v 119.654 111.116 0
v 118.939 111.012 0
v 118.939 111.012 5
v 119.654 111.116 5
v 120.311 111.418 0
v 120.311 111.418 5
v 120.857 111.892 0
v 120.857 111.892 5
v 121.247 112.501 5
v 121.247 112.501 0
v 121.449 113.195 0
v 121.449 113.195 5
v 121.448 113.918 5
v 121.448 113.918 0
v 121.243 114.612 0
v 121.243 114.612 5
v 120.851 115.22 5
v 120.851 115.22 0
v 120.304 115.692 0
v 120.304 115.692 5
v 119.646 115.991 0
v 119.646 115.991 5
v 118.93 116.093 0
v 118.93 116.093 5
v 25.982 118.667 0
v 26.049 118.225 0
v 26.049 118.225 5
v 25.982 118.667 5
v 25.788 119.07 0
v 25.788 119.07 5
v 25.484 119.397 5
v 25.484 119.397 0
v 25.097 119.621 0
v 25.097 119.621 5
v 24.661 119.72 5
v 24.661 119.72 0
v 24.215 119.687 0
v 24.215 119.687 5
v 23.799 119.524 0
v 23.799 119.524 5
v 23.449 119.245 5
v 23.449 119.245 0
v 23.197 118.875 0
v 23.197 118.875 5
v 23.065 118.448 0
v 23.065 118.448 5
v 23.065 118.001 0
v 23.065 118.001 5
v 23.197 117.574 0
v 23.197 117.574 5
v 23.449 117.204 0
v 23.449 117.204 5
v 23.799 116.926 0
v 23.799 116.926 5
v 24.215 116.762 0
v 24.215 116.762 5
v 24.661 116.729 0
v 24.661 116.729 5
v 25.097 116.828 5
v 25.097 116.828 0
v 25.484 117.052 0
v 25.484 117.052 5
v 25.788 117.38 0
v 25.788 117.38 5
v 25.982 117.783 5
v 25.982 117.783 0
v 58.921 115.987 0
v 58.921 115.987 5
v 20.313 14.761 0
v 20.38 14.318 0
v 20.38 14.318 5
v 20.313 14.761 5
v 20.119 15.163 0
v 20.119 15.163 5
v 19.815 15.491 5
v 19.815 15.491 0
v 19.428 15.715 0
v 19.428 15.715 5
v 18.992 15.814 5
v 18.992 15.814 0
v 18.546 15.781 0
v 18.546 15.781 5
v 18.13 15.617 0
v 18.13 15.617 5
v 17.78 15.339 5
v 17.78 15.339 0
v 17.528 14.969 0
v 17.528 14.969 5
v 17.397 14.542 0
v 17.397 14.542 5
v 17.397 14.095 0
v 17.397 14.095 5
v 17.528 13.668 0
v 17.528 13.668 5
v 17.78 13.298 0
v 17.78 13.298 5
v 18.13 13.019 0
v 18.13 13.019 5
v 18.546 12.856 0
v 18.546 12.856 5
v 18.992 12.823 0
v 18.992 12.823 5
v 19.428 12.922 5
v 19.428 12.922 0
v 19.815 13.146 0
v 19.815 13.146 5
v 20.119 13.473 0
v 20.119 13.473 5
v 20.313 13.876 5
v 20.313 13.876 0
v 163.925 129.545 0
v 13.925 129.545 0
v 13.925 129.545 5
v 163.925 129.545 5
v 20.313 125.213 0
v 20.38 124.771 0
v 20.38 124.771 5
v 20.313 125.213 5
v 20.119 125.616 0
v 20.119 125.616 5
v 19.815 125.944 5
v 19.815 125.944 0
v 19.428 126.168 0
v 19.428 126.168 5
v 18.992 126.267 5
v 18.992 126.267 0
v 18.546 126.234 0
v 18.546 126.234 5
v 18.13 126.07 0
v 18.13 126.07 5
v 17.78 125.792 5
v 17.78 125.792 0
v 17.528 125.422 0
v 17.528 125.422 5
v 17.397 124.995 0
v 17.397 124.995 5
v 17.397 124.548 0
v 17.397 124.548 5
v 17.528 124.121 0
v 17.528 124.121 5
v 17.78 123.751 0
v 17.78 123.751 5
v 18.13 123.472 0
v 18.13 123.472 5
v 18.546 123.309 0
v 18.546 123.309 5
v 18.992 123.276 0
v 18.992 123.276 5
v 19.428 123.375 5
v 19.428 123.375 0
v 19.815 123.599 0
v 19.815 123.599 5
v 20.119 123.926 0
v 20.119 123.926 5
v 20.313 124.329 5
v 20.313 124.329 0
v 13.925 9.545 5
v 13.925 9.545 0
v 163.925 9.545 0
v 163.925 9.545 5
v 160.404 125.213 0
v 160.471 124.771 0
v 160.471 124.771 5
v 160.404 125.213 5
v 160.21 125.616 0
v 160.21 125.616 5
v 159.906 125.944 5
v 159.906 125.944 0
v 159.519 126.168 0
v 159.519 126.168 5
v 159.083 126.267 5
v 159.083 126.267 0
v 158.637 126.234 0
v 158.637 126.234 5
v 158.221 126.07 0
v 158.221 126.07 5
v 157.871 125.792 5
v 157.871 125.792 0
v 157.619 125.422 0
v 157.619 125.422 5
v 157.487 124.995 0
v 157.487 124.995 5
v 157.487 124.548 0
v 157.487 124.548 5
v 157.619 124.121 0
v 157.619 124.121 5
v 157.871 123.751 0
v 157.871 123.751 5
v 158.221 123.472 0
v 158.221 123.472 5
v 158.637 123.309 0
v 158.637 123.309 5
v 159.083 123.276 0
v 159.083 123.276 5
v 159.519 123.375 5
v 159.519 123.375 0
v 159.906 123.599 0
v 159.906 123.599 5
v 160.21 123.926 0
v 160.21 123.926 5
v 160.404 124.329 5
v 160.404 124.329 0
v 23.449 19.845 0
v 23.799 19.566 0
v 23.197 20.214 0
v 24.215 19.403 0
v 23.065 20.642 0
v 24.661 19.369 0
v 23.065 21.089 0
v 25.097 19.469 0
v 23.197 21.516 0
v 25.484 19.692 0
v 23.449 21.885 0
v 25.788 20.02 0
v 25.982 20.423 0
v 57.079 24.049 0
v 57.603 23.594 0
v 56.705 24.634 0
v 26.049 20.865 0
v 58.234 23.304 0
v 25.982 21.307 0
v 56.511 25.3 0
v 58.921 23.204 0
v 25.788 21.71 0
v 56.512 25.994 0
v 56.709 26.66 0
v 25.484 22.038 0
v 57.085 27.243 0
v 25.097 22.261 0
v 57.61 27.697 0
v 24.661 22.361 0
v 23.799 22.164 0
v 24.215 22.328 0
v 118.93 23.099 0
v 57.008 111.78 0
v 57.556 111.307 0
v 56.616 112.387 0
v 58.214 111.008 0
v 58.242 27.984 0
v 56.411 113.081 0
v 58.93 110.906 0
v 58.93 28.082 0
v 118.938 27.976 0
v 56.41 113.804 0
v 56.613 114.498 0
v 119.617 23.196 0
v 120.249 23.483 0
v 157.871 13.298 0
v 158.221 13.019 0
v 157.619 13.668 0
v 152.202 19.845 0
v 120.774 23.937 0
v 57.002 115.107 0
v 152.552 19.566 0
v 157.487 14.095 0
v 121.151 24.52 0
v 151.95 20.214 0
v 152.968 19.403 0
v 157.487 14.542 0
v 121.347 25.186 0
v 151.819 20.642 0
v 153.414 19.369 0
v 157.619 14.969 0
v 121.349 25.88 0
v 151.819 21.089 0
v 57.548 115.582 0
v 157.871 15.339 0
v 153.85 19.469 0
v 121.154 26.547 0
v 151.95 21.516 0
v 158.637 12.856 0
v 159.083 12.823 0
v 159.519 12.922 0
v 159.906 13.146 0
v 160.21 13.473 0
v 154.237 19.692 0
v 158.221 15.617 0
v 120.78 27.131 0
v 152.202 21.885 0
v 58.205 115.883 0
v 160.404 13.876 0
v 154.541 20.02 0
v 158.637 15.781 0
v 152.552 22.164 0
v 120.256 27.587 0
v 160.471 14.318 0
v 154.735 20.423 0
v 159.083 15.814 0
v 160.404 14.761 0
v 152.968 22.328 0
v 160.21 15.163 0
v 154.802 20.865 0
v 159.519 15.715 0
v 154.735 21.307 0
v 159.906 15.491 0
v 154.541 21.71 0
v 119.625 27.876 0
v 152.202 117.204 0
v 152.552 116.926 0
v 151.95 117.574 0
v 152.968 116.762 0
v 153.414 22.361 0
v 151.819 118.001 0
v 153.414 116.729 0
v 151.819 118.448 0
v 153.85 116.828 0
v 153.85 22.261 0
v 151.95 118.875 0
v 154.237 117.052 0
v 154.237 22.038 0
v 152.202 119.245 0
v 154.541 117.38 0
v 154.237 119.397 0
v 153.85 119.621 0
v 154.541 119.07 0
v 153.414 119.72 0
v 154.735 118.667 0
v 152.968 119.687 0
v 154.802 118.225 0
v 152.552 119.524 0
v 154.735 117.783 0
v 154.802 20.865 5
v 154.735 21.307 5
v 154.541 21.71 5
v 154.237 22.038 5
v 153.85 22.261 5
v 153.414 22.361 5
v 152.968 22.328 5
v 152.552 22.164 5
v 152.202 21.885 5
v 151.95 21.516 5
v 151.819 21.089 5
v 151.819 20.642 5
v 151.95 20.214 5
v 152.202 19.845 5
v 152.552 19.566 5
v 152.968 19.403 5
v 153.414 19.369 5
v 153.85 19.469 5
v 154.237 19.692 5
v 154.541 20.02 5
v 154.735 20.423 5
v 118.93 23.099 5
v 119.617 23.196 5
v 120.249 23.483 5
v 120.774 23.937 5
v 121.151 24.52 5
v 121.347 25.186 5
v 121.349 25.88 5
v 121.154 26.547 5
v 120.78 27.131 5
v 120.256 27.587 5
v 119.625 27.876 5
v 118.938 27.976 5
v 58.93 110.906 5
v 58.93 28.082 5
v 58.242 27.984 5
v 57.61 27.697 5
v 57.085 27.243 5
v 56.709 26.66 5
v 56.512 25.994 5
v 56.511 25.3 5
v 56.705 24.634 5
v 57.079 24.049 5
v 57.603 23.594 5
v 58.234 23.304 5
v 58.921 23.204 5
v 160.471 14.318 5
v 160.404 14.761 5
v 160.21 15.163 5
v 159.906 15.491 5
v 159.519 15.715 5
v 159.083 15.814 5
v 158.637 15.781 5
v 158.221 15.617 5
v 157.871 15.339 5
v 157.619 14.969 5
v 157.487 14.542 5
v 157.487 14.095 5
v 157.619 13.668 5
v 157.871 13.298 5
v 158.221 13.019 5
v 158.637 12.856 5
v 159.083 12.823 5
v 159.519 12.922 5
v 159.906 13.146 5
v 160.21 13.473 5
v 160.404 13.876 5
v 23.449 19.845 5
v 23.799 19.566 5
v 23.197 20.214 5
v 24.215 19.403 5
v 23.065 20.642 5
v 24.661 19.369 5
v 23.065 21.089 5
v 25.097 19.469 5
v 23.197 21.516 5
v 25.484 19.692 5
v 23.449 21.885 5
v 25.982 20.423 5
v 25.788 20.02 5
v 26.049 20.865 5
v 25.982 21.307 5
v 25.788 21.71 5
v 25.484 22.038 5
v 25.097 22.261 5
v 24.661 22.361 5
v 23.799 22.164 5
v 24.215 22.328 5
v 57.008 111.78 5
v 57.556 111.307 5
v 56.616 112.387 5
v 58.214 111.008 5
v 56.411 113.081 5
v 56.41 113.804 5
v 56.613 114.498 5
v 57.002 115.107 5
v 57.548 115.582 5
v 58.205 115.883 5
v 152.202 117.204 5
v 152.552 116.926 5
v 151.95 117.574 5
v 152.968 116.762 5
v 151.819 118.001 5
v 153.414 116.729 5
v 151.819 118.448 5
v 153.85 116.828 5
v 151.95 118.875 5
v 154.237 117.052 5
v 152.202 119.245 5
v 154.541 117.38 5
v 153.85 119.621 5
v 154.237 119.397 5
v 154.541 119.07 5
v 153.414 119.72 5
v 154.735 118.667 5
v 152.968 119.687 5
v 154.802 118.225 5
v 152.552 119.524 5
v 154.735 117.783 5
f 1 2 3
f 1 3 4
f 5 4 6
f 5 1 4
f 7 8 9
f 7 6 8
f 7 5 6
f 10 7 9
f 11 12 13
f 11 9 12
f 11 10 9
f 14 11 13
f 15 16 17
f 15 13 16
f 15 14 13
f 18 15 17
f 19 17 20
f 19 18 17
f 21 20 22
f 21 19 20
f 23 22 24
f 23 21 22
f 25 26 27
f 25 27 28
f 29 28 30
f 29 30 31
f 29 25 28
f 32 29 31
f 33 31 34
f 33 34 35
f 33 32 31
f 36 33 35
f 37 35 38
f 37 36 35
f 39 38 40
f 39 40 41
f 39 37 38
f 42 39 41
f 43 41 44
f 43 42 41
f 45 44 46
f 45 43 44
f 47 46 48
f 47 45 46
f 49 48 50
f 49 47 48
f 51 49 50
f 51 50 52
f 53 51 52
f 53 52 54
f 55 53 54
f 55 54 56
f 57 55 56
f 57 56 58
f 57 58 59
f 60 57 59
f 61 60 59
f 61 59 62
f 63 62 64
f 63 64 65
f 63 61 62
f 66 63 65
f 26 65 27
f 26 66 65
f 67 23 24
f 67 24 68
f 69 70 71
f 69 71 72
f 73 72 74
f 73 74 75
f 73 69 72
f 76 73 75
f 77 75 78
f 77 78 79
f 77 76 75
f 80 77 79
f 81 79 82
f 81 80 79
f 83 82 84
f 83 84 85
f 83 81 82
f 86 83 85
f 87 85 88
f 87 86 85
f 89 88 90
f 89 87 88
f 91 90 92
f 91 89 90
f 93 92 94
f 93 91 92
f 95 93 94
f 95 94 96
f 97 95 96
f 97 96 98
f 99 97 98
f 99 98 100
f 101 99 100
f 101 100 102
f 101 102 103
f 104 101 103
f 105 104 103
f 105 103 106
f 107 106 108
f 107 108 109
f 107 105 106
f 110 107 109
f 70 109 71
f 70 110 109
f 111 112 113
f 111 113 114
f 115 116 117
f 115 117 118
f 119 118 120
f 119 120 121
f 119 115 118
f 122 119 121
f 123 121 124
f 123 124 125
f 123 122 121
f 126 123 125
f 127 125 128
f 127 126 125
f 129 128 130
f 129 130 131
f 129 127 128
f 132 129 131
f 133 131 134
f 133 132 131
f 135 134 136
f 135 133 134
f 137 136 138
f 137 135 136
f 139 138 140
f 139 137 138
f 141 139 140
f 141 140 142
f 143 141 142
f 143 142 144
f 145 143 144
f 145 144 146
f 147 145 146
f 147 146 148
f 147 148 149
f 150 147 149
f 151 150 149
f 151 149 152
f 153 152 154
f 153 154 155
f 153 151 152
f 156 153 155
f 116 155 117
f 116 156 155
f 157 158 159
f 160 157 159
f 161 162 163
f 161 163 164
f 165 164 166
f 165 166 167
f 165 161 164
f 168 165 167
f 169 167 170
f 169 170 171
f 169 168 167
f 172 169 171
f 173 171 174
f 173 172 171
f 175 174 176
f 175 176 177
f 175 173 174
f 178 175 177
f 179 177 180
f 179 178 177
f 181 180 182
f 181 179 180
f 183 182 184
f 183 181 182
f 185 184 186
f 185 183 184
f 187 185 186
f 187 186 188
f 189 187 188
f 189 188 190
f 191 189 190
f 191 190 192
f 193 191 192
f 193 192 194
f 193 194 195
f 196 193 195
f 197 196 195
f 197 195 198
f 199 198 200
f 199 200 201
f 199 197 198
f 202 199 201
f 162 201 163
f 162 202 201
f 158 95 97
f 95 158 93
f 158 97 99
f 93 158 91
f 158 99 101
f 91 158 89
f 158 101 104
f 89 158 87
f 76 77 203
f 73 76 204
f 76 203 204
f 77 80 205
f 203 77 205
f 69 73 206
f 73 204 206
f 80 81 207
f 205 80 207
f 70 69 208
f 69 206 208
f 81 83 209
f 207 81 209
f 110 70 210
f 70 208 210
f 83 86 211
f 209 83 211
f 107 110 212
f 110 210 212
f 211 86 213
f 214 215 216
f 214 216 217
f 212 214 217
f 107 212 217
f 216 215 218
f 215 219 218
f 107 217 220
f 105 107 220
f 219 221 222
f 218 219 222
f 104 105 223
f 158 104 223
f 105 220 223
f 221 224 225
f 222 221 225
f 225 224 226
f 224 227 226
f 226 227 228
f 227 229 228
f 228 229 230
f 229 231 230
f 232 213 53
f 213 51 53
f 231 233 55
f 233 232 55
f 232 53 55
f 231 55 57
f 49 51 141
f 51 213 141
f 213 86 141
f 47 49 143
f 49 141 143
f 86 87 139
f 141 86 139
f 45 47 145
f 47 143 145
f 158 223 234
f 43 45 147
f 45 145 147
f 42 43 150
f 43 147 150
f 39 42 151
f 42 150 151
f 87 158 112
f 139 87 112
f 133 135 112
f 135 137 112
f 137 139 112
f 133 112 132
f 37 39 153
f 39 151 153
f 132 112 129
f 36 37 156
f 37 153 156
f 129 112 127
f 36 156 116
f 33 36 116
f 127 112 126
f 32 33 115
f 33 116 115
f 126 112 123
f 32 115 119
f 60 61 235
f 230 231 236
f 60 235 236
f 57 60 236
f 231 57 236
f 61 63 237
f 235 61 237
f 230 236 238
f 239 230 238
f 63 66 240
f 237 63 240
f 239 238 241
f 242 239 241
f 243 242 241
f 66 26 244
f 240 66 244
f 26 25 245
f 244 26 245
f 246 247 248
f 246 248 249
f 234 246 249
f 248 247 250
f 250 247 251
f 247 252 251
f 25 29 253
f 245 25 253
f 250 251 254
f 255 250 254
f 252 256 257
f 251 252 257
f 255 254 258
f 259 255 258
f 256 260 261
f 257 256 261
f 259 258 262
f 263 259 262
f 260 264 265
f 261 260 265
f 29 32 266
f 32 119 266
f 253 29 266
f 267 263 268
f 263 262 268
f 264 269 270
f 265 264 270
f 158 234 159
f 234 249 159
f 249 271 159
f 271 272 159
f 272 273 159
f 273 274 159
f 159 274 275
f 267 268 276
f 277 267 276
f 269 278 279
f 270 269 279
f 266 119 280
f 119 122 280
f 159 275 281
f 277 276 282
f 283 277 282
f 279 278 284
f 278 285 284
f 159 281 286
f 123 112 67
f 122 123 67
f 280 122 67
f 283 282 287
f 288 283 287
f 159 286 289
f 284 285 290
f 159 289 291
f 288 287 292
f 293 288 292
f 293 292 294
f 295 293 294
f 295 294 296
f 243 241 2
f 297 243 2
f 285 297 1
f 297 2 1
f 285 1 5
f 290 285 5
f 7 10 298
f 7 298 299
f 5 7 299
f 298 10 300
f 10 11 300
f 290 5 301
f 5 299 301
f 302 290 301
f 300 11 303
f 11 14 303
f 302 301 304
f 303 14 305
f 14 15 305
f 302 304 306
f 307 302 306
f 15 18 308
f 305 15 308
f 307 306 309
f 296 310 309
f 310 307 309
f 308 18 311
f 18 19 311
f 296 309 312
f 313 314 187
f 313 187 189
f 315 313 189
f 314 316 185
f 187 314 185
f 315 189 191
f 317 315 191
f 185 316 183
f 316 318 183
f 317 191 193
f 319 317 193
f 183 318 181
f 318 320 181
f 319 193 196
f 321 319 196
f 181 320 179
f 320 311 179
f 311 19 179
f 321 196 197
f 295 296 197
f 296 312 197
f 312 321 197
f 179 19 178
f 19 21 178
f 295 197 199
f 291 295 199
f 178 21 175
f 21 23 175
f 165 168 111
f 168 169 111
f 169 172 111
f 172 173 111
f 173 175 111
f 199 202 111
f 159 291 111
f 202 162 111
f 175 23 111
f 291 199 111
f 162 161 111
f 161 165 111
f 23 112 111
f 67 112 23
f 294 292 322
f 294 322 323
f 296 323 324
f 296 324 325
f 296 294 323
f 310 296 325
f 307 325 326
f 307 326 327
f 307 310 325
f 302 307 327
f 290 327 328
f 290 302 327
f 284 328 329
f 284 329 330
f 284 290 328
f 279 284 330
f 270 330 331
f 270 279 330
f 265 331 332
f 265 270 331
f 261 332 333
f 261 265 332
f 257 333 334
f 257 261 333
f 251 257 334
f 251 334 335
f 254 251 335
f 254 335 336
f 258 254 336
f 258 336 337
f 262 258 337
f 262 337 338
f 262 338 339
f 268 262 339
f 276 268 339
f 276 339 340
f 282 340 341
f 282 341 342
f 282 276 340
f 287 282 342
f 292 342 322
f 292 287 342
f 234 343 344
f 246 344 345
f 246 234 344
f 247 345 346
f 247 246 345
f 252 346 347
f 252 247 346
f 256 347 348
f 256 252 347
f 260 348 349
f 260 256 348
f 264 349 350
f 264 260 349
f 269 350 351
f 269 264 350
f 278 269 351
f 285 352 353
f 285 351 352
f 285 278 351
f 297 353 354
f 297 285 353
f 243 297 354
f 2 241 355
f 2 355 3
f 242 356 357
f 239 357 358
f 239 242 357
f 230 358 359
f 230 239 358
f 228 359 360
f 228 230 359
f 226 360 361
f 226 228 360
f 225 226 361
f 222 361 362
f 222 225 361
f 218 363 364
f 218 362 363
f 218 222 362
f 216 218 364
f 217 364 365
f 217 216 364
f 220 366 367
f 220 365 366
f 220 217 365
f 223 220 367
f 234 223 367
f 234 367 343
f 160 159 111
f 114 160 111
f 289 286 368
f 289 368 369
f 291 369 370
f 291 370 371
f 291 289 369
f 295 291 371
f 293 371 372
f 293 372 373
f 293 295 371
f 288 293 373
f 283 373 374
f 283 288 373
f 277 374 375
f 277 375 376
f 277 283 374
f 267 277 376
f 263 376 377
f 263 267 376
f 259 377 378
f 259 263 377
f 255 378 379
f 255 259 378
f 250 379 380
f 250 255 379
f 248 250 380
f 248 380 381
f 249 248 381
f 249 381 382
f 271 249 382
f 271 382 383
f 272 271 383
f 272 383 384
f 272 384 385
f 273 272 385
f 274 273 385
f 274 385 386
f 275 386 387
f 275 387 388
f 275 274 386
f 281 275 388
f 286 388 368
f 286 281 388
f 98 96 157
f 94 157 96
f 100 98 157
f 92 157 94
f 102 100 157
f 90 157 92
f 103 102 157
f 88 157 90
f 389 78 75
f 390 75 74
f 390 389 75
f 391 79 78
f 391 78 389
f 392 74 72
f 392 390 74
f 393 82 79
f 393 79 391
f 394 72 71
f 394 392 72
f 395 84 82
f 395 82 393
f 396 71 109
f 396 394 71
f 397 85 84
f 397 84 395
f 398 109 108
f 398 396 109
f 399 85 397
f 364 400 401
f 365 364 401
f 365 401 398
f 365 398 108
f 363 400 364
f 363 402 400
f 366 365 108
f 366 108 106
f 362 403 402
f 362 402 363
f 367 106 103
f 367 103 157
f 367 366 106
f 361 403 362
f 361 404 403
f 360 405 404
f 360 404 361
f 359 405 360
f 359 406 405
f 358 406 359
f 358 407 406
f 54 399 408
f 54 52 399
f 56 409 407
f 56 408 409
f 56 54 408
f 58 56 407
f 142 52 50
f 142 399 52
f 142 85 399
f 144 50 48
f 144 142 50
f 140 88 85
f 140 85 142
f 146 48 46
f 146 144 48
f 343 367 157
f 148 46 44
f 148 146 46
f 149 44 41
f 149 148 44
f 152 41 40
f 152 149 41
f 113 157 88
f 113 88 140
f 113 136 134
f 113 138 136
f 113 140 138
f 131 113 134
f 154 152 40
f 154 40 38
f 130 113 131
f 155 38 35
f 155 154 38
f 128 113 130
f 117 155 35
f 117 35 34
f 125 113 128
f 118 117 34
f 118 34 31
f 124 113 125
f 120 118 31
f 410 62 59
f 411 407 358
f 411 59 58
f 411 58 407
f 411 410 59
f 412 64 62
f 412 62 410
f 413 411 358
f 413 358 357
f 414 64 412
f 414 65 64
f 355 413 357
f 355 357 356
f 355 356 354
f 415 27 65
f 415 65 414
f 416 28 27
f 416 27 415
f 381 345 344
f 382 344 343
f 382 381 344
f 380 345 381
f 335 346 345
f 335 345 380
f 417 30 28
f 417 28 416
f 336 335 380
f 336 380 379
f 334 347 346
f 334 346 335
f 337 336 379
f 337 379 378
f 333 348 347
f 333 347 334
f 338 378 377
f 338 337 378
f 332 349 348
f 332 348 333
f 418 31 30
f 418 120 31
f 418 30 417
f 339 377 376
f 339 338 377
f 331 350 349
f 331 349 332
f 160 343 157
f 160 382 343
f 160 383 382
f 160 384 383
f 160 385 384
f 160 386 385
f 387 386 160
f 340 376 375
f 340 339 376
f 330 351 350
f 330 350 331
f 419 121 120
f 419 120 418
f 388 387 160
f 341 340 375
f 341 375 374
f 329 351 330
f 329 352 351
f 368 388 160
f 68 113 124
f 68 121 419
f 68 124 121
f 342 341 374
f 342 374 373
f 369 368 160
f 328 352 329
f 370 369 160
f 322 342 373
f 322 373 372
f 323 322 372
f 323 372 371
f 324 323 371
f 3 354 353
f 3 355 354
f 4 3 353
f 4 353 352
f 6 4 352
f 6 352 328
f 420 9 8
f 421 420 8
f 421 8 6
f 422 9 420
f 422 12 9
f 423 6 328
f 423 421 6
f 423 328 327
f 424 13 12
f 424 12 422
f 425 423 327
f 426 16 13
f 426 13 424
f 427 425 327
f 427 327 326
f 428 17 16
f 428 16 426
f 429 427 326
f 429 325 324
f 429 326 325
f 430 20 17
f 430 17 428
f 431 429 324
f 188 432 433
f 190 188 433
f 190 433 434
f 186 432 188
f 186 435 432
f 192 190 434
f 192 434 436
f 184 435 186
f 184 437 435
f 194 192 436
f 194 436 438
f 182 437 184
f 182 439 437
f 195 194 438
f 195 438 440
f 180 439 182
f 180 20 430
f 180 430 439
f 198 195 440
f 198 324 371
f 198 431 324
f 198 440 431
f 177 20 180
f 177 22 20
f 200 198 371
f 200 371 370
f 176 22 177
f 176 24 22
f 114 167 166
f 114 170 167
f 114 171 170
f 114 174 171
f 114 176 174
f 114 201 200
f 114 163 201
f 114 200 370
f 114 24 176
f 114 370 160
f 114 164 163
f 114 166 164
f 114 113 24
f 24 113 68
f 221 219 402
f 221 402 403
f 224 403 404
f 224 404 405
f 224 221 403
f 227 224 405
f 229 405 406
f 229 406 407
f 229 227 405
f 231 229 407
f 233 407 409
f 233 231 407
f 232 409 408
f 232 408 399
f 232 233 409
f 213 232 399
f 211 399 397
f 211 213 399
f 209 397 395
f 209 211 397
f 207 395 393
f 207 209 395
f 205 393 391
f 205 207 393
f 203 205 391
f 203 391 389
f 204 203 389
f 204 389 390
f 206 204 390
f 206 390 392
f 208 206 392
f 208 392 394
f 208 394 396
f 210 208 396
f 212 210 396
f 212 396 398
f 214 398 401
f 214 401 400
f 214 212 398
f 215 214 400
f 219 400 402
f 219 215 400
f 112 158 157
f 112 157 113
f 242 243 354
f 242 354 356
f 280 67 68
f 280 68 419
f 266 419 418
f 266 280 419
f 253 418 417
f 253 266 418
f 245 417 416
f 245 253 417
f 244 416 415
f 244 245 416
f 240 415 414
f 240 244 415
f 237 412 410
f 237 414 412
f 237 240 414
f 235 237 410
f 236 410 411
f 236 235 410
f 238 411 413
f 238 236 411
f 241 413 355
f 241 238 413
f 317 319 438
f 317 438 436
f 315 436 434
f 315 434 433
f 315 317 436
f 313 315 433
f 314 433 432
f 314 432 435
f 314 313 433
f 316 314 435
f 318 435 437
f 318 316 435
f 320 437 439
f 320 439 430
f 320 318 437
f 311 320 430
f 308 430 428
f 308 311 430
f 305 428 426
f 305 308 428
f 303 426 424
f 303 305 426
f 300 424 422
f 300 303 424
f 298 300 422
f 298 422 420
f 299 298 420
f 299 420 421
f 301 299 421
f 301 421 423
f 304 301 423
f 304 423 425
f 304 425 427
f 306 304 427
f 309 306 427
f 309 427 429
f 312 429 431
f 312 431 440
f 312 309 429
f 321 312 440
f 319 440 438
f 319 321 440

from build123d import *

# Parameters (mm, degrees)
MODEL_W             = 150
MODEL_H             = 120
MODEL_R             = 1.5
BOSS_EXTRUDE1_DEPTH = 5
CUT_EXTRUDE1_DEPTH  = 209.993753976


with BuildPart() as part:
    # Model → Boss-Extrude1 (new body)
    with BuildSketch(Plane.XY):
        with Locations((88.925313808, 69.54489837)):
            Rectangle(MODEL_W, MODEL_H)
        with Locations((18.879939798, 124.771335066)):
            Circle(MODEL_R, mode=Mode.SUBTRACT)
        with Locations((158.970687817, 124.771335066)):
            Circle(MODEL_R, mode=Mode.SUBTRACT)
        with Locations((18.879939798, 14.318461674)):
            Circle(MODEL_R, mode=Mode.SUBTRACT)
        with Locations((158.970687817, 14.318461674)):
            Circle(MODEL_R, mode=Mode.SUBTRACT)
        with Locations((24.548687541, 118.224668434)):
            Circle(MODEL_R, mode=Mode.SUBTRACT)
        with Locations((153.301940075, 118.224668434)):
            Circle(MODEL_R, mode=Mode.SUBTRACT)
        with Locations((24.548687541, 20.865128307)):
            Circle(MODEL_R, mode=Mode.SUBTRACT)
        with Locations((153.301940075, 20.865128307)):
            Circle(MODEL_R, mode=Mode.SUBTRACT)
    extrude(amount=BOSS_EXTRUDE1_DEPTH)

    # Sketch2 → Cut-Extrude1 (cut, through all)
    with BuildSketch(Plane(origin=(0, 0, 0), x_dir=(-1, 0, 0), z_dir=(0, 0, -1))):
        with BuildLine():
            Line((-58.929782285, 110.90640838), (-118.938578053, 111.011957594))
            ThreePointArc((-118.938578053, 111.011957594), (-121.474611242, 113.556927738), (-118.929641098, 116.092960927))
            Line((-118.929641098, 116.092960927), (-58.92084533, 115.987411713))
            ThreePointArc((-58.92084533, 115.987411713), (-56.384812141, 113.442441569), (-58.929782285, 110.90640838))
        make_face()
        with BuildLine():
            Line((-58.921024216, 23.204088411), (-118.929819984, 23.098539197))
            ThreePointArc((-118.929819984, 23.098539197), (-121.372907859, 25.533047888), (-118.938399168, 27.976135764))
            Line((-118.938399168, 27.976135764), (-58.9296034, 28.081684978))
            ThreePointArc((-58.9296034, 28.081684978), (-56.486515525, 25.647176286), (-58.921024216, 23.204088411))
        make_face()
    extrude(amount=-CUT_EXTRUDE1_DEPTH, mode=Mode.SUBTRACT)


solid = part.part
